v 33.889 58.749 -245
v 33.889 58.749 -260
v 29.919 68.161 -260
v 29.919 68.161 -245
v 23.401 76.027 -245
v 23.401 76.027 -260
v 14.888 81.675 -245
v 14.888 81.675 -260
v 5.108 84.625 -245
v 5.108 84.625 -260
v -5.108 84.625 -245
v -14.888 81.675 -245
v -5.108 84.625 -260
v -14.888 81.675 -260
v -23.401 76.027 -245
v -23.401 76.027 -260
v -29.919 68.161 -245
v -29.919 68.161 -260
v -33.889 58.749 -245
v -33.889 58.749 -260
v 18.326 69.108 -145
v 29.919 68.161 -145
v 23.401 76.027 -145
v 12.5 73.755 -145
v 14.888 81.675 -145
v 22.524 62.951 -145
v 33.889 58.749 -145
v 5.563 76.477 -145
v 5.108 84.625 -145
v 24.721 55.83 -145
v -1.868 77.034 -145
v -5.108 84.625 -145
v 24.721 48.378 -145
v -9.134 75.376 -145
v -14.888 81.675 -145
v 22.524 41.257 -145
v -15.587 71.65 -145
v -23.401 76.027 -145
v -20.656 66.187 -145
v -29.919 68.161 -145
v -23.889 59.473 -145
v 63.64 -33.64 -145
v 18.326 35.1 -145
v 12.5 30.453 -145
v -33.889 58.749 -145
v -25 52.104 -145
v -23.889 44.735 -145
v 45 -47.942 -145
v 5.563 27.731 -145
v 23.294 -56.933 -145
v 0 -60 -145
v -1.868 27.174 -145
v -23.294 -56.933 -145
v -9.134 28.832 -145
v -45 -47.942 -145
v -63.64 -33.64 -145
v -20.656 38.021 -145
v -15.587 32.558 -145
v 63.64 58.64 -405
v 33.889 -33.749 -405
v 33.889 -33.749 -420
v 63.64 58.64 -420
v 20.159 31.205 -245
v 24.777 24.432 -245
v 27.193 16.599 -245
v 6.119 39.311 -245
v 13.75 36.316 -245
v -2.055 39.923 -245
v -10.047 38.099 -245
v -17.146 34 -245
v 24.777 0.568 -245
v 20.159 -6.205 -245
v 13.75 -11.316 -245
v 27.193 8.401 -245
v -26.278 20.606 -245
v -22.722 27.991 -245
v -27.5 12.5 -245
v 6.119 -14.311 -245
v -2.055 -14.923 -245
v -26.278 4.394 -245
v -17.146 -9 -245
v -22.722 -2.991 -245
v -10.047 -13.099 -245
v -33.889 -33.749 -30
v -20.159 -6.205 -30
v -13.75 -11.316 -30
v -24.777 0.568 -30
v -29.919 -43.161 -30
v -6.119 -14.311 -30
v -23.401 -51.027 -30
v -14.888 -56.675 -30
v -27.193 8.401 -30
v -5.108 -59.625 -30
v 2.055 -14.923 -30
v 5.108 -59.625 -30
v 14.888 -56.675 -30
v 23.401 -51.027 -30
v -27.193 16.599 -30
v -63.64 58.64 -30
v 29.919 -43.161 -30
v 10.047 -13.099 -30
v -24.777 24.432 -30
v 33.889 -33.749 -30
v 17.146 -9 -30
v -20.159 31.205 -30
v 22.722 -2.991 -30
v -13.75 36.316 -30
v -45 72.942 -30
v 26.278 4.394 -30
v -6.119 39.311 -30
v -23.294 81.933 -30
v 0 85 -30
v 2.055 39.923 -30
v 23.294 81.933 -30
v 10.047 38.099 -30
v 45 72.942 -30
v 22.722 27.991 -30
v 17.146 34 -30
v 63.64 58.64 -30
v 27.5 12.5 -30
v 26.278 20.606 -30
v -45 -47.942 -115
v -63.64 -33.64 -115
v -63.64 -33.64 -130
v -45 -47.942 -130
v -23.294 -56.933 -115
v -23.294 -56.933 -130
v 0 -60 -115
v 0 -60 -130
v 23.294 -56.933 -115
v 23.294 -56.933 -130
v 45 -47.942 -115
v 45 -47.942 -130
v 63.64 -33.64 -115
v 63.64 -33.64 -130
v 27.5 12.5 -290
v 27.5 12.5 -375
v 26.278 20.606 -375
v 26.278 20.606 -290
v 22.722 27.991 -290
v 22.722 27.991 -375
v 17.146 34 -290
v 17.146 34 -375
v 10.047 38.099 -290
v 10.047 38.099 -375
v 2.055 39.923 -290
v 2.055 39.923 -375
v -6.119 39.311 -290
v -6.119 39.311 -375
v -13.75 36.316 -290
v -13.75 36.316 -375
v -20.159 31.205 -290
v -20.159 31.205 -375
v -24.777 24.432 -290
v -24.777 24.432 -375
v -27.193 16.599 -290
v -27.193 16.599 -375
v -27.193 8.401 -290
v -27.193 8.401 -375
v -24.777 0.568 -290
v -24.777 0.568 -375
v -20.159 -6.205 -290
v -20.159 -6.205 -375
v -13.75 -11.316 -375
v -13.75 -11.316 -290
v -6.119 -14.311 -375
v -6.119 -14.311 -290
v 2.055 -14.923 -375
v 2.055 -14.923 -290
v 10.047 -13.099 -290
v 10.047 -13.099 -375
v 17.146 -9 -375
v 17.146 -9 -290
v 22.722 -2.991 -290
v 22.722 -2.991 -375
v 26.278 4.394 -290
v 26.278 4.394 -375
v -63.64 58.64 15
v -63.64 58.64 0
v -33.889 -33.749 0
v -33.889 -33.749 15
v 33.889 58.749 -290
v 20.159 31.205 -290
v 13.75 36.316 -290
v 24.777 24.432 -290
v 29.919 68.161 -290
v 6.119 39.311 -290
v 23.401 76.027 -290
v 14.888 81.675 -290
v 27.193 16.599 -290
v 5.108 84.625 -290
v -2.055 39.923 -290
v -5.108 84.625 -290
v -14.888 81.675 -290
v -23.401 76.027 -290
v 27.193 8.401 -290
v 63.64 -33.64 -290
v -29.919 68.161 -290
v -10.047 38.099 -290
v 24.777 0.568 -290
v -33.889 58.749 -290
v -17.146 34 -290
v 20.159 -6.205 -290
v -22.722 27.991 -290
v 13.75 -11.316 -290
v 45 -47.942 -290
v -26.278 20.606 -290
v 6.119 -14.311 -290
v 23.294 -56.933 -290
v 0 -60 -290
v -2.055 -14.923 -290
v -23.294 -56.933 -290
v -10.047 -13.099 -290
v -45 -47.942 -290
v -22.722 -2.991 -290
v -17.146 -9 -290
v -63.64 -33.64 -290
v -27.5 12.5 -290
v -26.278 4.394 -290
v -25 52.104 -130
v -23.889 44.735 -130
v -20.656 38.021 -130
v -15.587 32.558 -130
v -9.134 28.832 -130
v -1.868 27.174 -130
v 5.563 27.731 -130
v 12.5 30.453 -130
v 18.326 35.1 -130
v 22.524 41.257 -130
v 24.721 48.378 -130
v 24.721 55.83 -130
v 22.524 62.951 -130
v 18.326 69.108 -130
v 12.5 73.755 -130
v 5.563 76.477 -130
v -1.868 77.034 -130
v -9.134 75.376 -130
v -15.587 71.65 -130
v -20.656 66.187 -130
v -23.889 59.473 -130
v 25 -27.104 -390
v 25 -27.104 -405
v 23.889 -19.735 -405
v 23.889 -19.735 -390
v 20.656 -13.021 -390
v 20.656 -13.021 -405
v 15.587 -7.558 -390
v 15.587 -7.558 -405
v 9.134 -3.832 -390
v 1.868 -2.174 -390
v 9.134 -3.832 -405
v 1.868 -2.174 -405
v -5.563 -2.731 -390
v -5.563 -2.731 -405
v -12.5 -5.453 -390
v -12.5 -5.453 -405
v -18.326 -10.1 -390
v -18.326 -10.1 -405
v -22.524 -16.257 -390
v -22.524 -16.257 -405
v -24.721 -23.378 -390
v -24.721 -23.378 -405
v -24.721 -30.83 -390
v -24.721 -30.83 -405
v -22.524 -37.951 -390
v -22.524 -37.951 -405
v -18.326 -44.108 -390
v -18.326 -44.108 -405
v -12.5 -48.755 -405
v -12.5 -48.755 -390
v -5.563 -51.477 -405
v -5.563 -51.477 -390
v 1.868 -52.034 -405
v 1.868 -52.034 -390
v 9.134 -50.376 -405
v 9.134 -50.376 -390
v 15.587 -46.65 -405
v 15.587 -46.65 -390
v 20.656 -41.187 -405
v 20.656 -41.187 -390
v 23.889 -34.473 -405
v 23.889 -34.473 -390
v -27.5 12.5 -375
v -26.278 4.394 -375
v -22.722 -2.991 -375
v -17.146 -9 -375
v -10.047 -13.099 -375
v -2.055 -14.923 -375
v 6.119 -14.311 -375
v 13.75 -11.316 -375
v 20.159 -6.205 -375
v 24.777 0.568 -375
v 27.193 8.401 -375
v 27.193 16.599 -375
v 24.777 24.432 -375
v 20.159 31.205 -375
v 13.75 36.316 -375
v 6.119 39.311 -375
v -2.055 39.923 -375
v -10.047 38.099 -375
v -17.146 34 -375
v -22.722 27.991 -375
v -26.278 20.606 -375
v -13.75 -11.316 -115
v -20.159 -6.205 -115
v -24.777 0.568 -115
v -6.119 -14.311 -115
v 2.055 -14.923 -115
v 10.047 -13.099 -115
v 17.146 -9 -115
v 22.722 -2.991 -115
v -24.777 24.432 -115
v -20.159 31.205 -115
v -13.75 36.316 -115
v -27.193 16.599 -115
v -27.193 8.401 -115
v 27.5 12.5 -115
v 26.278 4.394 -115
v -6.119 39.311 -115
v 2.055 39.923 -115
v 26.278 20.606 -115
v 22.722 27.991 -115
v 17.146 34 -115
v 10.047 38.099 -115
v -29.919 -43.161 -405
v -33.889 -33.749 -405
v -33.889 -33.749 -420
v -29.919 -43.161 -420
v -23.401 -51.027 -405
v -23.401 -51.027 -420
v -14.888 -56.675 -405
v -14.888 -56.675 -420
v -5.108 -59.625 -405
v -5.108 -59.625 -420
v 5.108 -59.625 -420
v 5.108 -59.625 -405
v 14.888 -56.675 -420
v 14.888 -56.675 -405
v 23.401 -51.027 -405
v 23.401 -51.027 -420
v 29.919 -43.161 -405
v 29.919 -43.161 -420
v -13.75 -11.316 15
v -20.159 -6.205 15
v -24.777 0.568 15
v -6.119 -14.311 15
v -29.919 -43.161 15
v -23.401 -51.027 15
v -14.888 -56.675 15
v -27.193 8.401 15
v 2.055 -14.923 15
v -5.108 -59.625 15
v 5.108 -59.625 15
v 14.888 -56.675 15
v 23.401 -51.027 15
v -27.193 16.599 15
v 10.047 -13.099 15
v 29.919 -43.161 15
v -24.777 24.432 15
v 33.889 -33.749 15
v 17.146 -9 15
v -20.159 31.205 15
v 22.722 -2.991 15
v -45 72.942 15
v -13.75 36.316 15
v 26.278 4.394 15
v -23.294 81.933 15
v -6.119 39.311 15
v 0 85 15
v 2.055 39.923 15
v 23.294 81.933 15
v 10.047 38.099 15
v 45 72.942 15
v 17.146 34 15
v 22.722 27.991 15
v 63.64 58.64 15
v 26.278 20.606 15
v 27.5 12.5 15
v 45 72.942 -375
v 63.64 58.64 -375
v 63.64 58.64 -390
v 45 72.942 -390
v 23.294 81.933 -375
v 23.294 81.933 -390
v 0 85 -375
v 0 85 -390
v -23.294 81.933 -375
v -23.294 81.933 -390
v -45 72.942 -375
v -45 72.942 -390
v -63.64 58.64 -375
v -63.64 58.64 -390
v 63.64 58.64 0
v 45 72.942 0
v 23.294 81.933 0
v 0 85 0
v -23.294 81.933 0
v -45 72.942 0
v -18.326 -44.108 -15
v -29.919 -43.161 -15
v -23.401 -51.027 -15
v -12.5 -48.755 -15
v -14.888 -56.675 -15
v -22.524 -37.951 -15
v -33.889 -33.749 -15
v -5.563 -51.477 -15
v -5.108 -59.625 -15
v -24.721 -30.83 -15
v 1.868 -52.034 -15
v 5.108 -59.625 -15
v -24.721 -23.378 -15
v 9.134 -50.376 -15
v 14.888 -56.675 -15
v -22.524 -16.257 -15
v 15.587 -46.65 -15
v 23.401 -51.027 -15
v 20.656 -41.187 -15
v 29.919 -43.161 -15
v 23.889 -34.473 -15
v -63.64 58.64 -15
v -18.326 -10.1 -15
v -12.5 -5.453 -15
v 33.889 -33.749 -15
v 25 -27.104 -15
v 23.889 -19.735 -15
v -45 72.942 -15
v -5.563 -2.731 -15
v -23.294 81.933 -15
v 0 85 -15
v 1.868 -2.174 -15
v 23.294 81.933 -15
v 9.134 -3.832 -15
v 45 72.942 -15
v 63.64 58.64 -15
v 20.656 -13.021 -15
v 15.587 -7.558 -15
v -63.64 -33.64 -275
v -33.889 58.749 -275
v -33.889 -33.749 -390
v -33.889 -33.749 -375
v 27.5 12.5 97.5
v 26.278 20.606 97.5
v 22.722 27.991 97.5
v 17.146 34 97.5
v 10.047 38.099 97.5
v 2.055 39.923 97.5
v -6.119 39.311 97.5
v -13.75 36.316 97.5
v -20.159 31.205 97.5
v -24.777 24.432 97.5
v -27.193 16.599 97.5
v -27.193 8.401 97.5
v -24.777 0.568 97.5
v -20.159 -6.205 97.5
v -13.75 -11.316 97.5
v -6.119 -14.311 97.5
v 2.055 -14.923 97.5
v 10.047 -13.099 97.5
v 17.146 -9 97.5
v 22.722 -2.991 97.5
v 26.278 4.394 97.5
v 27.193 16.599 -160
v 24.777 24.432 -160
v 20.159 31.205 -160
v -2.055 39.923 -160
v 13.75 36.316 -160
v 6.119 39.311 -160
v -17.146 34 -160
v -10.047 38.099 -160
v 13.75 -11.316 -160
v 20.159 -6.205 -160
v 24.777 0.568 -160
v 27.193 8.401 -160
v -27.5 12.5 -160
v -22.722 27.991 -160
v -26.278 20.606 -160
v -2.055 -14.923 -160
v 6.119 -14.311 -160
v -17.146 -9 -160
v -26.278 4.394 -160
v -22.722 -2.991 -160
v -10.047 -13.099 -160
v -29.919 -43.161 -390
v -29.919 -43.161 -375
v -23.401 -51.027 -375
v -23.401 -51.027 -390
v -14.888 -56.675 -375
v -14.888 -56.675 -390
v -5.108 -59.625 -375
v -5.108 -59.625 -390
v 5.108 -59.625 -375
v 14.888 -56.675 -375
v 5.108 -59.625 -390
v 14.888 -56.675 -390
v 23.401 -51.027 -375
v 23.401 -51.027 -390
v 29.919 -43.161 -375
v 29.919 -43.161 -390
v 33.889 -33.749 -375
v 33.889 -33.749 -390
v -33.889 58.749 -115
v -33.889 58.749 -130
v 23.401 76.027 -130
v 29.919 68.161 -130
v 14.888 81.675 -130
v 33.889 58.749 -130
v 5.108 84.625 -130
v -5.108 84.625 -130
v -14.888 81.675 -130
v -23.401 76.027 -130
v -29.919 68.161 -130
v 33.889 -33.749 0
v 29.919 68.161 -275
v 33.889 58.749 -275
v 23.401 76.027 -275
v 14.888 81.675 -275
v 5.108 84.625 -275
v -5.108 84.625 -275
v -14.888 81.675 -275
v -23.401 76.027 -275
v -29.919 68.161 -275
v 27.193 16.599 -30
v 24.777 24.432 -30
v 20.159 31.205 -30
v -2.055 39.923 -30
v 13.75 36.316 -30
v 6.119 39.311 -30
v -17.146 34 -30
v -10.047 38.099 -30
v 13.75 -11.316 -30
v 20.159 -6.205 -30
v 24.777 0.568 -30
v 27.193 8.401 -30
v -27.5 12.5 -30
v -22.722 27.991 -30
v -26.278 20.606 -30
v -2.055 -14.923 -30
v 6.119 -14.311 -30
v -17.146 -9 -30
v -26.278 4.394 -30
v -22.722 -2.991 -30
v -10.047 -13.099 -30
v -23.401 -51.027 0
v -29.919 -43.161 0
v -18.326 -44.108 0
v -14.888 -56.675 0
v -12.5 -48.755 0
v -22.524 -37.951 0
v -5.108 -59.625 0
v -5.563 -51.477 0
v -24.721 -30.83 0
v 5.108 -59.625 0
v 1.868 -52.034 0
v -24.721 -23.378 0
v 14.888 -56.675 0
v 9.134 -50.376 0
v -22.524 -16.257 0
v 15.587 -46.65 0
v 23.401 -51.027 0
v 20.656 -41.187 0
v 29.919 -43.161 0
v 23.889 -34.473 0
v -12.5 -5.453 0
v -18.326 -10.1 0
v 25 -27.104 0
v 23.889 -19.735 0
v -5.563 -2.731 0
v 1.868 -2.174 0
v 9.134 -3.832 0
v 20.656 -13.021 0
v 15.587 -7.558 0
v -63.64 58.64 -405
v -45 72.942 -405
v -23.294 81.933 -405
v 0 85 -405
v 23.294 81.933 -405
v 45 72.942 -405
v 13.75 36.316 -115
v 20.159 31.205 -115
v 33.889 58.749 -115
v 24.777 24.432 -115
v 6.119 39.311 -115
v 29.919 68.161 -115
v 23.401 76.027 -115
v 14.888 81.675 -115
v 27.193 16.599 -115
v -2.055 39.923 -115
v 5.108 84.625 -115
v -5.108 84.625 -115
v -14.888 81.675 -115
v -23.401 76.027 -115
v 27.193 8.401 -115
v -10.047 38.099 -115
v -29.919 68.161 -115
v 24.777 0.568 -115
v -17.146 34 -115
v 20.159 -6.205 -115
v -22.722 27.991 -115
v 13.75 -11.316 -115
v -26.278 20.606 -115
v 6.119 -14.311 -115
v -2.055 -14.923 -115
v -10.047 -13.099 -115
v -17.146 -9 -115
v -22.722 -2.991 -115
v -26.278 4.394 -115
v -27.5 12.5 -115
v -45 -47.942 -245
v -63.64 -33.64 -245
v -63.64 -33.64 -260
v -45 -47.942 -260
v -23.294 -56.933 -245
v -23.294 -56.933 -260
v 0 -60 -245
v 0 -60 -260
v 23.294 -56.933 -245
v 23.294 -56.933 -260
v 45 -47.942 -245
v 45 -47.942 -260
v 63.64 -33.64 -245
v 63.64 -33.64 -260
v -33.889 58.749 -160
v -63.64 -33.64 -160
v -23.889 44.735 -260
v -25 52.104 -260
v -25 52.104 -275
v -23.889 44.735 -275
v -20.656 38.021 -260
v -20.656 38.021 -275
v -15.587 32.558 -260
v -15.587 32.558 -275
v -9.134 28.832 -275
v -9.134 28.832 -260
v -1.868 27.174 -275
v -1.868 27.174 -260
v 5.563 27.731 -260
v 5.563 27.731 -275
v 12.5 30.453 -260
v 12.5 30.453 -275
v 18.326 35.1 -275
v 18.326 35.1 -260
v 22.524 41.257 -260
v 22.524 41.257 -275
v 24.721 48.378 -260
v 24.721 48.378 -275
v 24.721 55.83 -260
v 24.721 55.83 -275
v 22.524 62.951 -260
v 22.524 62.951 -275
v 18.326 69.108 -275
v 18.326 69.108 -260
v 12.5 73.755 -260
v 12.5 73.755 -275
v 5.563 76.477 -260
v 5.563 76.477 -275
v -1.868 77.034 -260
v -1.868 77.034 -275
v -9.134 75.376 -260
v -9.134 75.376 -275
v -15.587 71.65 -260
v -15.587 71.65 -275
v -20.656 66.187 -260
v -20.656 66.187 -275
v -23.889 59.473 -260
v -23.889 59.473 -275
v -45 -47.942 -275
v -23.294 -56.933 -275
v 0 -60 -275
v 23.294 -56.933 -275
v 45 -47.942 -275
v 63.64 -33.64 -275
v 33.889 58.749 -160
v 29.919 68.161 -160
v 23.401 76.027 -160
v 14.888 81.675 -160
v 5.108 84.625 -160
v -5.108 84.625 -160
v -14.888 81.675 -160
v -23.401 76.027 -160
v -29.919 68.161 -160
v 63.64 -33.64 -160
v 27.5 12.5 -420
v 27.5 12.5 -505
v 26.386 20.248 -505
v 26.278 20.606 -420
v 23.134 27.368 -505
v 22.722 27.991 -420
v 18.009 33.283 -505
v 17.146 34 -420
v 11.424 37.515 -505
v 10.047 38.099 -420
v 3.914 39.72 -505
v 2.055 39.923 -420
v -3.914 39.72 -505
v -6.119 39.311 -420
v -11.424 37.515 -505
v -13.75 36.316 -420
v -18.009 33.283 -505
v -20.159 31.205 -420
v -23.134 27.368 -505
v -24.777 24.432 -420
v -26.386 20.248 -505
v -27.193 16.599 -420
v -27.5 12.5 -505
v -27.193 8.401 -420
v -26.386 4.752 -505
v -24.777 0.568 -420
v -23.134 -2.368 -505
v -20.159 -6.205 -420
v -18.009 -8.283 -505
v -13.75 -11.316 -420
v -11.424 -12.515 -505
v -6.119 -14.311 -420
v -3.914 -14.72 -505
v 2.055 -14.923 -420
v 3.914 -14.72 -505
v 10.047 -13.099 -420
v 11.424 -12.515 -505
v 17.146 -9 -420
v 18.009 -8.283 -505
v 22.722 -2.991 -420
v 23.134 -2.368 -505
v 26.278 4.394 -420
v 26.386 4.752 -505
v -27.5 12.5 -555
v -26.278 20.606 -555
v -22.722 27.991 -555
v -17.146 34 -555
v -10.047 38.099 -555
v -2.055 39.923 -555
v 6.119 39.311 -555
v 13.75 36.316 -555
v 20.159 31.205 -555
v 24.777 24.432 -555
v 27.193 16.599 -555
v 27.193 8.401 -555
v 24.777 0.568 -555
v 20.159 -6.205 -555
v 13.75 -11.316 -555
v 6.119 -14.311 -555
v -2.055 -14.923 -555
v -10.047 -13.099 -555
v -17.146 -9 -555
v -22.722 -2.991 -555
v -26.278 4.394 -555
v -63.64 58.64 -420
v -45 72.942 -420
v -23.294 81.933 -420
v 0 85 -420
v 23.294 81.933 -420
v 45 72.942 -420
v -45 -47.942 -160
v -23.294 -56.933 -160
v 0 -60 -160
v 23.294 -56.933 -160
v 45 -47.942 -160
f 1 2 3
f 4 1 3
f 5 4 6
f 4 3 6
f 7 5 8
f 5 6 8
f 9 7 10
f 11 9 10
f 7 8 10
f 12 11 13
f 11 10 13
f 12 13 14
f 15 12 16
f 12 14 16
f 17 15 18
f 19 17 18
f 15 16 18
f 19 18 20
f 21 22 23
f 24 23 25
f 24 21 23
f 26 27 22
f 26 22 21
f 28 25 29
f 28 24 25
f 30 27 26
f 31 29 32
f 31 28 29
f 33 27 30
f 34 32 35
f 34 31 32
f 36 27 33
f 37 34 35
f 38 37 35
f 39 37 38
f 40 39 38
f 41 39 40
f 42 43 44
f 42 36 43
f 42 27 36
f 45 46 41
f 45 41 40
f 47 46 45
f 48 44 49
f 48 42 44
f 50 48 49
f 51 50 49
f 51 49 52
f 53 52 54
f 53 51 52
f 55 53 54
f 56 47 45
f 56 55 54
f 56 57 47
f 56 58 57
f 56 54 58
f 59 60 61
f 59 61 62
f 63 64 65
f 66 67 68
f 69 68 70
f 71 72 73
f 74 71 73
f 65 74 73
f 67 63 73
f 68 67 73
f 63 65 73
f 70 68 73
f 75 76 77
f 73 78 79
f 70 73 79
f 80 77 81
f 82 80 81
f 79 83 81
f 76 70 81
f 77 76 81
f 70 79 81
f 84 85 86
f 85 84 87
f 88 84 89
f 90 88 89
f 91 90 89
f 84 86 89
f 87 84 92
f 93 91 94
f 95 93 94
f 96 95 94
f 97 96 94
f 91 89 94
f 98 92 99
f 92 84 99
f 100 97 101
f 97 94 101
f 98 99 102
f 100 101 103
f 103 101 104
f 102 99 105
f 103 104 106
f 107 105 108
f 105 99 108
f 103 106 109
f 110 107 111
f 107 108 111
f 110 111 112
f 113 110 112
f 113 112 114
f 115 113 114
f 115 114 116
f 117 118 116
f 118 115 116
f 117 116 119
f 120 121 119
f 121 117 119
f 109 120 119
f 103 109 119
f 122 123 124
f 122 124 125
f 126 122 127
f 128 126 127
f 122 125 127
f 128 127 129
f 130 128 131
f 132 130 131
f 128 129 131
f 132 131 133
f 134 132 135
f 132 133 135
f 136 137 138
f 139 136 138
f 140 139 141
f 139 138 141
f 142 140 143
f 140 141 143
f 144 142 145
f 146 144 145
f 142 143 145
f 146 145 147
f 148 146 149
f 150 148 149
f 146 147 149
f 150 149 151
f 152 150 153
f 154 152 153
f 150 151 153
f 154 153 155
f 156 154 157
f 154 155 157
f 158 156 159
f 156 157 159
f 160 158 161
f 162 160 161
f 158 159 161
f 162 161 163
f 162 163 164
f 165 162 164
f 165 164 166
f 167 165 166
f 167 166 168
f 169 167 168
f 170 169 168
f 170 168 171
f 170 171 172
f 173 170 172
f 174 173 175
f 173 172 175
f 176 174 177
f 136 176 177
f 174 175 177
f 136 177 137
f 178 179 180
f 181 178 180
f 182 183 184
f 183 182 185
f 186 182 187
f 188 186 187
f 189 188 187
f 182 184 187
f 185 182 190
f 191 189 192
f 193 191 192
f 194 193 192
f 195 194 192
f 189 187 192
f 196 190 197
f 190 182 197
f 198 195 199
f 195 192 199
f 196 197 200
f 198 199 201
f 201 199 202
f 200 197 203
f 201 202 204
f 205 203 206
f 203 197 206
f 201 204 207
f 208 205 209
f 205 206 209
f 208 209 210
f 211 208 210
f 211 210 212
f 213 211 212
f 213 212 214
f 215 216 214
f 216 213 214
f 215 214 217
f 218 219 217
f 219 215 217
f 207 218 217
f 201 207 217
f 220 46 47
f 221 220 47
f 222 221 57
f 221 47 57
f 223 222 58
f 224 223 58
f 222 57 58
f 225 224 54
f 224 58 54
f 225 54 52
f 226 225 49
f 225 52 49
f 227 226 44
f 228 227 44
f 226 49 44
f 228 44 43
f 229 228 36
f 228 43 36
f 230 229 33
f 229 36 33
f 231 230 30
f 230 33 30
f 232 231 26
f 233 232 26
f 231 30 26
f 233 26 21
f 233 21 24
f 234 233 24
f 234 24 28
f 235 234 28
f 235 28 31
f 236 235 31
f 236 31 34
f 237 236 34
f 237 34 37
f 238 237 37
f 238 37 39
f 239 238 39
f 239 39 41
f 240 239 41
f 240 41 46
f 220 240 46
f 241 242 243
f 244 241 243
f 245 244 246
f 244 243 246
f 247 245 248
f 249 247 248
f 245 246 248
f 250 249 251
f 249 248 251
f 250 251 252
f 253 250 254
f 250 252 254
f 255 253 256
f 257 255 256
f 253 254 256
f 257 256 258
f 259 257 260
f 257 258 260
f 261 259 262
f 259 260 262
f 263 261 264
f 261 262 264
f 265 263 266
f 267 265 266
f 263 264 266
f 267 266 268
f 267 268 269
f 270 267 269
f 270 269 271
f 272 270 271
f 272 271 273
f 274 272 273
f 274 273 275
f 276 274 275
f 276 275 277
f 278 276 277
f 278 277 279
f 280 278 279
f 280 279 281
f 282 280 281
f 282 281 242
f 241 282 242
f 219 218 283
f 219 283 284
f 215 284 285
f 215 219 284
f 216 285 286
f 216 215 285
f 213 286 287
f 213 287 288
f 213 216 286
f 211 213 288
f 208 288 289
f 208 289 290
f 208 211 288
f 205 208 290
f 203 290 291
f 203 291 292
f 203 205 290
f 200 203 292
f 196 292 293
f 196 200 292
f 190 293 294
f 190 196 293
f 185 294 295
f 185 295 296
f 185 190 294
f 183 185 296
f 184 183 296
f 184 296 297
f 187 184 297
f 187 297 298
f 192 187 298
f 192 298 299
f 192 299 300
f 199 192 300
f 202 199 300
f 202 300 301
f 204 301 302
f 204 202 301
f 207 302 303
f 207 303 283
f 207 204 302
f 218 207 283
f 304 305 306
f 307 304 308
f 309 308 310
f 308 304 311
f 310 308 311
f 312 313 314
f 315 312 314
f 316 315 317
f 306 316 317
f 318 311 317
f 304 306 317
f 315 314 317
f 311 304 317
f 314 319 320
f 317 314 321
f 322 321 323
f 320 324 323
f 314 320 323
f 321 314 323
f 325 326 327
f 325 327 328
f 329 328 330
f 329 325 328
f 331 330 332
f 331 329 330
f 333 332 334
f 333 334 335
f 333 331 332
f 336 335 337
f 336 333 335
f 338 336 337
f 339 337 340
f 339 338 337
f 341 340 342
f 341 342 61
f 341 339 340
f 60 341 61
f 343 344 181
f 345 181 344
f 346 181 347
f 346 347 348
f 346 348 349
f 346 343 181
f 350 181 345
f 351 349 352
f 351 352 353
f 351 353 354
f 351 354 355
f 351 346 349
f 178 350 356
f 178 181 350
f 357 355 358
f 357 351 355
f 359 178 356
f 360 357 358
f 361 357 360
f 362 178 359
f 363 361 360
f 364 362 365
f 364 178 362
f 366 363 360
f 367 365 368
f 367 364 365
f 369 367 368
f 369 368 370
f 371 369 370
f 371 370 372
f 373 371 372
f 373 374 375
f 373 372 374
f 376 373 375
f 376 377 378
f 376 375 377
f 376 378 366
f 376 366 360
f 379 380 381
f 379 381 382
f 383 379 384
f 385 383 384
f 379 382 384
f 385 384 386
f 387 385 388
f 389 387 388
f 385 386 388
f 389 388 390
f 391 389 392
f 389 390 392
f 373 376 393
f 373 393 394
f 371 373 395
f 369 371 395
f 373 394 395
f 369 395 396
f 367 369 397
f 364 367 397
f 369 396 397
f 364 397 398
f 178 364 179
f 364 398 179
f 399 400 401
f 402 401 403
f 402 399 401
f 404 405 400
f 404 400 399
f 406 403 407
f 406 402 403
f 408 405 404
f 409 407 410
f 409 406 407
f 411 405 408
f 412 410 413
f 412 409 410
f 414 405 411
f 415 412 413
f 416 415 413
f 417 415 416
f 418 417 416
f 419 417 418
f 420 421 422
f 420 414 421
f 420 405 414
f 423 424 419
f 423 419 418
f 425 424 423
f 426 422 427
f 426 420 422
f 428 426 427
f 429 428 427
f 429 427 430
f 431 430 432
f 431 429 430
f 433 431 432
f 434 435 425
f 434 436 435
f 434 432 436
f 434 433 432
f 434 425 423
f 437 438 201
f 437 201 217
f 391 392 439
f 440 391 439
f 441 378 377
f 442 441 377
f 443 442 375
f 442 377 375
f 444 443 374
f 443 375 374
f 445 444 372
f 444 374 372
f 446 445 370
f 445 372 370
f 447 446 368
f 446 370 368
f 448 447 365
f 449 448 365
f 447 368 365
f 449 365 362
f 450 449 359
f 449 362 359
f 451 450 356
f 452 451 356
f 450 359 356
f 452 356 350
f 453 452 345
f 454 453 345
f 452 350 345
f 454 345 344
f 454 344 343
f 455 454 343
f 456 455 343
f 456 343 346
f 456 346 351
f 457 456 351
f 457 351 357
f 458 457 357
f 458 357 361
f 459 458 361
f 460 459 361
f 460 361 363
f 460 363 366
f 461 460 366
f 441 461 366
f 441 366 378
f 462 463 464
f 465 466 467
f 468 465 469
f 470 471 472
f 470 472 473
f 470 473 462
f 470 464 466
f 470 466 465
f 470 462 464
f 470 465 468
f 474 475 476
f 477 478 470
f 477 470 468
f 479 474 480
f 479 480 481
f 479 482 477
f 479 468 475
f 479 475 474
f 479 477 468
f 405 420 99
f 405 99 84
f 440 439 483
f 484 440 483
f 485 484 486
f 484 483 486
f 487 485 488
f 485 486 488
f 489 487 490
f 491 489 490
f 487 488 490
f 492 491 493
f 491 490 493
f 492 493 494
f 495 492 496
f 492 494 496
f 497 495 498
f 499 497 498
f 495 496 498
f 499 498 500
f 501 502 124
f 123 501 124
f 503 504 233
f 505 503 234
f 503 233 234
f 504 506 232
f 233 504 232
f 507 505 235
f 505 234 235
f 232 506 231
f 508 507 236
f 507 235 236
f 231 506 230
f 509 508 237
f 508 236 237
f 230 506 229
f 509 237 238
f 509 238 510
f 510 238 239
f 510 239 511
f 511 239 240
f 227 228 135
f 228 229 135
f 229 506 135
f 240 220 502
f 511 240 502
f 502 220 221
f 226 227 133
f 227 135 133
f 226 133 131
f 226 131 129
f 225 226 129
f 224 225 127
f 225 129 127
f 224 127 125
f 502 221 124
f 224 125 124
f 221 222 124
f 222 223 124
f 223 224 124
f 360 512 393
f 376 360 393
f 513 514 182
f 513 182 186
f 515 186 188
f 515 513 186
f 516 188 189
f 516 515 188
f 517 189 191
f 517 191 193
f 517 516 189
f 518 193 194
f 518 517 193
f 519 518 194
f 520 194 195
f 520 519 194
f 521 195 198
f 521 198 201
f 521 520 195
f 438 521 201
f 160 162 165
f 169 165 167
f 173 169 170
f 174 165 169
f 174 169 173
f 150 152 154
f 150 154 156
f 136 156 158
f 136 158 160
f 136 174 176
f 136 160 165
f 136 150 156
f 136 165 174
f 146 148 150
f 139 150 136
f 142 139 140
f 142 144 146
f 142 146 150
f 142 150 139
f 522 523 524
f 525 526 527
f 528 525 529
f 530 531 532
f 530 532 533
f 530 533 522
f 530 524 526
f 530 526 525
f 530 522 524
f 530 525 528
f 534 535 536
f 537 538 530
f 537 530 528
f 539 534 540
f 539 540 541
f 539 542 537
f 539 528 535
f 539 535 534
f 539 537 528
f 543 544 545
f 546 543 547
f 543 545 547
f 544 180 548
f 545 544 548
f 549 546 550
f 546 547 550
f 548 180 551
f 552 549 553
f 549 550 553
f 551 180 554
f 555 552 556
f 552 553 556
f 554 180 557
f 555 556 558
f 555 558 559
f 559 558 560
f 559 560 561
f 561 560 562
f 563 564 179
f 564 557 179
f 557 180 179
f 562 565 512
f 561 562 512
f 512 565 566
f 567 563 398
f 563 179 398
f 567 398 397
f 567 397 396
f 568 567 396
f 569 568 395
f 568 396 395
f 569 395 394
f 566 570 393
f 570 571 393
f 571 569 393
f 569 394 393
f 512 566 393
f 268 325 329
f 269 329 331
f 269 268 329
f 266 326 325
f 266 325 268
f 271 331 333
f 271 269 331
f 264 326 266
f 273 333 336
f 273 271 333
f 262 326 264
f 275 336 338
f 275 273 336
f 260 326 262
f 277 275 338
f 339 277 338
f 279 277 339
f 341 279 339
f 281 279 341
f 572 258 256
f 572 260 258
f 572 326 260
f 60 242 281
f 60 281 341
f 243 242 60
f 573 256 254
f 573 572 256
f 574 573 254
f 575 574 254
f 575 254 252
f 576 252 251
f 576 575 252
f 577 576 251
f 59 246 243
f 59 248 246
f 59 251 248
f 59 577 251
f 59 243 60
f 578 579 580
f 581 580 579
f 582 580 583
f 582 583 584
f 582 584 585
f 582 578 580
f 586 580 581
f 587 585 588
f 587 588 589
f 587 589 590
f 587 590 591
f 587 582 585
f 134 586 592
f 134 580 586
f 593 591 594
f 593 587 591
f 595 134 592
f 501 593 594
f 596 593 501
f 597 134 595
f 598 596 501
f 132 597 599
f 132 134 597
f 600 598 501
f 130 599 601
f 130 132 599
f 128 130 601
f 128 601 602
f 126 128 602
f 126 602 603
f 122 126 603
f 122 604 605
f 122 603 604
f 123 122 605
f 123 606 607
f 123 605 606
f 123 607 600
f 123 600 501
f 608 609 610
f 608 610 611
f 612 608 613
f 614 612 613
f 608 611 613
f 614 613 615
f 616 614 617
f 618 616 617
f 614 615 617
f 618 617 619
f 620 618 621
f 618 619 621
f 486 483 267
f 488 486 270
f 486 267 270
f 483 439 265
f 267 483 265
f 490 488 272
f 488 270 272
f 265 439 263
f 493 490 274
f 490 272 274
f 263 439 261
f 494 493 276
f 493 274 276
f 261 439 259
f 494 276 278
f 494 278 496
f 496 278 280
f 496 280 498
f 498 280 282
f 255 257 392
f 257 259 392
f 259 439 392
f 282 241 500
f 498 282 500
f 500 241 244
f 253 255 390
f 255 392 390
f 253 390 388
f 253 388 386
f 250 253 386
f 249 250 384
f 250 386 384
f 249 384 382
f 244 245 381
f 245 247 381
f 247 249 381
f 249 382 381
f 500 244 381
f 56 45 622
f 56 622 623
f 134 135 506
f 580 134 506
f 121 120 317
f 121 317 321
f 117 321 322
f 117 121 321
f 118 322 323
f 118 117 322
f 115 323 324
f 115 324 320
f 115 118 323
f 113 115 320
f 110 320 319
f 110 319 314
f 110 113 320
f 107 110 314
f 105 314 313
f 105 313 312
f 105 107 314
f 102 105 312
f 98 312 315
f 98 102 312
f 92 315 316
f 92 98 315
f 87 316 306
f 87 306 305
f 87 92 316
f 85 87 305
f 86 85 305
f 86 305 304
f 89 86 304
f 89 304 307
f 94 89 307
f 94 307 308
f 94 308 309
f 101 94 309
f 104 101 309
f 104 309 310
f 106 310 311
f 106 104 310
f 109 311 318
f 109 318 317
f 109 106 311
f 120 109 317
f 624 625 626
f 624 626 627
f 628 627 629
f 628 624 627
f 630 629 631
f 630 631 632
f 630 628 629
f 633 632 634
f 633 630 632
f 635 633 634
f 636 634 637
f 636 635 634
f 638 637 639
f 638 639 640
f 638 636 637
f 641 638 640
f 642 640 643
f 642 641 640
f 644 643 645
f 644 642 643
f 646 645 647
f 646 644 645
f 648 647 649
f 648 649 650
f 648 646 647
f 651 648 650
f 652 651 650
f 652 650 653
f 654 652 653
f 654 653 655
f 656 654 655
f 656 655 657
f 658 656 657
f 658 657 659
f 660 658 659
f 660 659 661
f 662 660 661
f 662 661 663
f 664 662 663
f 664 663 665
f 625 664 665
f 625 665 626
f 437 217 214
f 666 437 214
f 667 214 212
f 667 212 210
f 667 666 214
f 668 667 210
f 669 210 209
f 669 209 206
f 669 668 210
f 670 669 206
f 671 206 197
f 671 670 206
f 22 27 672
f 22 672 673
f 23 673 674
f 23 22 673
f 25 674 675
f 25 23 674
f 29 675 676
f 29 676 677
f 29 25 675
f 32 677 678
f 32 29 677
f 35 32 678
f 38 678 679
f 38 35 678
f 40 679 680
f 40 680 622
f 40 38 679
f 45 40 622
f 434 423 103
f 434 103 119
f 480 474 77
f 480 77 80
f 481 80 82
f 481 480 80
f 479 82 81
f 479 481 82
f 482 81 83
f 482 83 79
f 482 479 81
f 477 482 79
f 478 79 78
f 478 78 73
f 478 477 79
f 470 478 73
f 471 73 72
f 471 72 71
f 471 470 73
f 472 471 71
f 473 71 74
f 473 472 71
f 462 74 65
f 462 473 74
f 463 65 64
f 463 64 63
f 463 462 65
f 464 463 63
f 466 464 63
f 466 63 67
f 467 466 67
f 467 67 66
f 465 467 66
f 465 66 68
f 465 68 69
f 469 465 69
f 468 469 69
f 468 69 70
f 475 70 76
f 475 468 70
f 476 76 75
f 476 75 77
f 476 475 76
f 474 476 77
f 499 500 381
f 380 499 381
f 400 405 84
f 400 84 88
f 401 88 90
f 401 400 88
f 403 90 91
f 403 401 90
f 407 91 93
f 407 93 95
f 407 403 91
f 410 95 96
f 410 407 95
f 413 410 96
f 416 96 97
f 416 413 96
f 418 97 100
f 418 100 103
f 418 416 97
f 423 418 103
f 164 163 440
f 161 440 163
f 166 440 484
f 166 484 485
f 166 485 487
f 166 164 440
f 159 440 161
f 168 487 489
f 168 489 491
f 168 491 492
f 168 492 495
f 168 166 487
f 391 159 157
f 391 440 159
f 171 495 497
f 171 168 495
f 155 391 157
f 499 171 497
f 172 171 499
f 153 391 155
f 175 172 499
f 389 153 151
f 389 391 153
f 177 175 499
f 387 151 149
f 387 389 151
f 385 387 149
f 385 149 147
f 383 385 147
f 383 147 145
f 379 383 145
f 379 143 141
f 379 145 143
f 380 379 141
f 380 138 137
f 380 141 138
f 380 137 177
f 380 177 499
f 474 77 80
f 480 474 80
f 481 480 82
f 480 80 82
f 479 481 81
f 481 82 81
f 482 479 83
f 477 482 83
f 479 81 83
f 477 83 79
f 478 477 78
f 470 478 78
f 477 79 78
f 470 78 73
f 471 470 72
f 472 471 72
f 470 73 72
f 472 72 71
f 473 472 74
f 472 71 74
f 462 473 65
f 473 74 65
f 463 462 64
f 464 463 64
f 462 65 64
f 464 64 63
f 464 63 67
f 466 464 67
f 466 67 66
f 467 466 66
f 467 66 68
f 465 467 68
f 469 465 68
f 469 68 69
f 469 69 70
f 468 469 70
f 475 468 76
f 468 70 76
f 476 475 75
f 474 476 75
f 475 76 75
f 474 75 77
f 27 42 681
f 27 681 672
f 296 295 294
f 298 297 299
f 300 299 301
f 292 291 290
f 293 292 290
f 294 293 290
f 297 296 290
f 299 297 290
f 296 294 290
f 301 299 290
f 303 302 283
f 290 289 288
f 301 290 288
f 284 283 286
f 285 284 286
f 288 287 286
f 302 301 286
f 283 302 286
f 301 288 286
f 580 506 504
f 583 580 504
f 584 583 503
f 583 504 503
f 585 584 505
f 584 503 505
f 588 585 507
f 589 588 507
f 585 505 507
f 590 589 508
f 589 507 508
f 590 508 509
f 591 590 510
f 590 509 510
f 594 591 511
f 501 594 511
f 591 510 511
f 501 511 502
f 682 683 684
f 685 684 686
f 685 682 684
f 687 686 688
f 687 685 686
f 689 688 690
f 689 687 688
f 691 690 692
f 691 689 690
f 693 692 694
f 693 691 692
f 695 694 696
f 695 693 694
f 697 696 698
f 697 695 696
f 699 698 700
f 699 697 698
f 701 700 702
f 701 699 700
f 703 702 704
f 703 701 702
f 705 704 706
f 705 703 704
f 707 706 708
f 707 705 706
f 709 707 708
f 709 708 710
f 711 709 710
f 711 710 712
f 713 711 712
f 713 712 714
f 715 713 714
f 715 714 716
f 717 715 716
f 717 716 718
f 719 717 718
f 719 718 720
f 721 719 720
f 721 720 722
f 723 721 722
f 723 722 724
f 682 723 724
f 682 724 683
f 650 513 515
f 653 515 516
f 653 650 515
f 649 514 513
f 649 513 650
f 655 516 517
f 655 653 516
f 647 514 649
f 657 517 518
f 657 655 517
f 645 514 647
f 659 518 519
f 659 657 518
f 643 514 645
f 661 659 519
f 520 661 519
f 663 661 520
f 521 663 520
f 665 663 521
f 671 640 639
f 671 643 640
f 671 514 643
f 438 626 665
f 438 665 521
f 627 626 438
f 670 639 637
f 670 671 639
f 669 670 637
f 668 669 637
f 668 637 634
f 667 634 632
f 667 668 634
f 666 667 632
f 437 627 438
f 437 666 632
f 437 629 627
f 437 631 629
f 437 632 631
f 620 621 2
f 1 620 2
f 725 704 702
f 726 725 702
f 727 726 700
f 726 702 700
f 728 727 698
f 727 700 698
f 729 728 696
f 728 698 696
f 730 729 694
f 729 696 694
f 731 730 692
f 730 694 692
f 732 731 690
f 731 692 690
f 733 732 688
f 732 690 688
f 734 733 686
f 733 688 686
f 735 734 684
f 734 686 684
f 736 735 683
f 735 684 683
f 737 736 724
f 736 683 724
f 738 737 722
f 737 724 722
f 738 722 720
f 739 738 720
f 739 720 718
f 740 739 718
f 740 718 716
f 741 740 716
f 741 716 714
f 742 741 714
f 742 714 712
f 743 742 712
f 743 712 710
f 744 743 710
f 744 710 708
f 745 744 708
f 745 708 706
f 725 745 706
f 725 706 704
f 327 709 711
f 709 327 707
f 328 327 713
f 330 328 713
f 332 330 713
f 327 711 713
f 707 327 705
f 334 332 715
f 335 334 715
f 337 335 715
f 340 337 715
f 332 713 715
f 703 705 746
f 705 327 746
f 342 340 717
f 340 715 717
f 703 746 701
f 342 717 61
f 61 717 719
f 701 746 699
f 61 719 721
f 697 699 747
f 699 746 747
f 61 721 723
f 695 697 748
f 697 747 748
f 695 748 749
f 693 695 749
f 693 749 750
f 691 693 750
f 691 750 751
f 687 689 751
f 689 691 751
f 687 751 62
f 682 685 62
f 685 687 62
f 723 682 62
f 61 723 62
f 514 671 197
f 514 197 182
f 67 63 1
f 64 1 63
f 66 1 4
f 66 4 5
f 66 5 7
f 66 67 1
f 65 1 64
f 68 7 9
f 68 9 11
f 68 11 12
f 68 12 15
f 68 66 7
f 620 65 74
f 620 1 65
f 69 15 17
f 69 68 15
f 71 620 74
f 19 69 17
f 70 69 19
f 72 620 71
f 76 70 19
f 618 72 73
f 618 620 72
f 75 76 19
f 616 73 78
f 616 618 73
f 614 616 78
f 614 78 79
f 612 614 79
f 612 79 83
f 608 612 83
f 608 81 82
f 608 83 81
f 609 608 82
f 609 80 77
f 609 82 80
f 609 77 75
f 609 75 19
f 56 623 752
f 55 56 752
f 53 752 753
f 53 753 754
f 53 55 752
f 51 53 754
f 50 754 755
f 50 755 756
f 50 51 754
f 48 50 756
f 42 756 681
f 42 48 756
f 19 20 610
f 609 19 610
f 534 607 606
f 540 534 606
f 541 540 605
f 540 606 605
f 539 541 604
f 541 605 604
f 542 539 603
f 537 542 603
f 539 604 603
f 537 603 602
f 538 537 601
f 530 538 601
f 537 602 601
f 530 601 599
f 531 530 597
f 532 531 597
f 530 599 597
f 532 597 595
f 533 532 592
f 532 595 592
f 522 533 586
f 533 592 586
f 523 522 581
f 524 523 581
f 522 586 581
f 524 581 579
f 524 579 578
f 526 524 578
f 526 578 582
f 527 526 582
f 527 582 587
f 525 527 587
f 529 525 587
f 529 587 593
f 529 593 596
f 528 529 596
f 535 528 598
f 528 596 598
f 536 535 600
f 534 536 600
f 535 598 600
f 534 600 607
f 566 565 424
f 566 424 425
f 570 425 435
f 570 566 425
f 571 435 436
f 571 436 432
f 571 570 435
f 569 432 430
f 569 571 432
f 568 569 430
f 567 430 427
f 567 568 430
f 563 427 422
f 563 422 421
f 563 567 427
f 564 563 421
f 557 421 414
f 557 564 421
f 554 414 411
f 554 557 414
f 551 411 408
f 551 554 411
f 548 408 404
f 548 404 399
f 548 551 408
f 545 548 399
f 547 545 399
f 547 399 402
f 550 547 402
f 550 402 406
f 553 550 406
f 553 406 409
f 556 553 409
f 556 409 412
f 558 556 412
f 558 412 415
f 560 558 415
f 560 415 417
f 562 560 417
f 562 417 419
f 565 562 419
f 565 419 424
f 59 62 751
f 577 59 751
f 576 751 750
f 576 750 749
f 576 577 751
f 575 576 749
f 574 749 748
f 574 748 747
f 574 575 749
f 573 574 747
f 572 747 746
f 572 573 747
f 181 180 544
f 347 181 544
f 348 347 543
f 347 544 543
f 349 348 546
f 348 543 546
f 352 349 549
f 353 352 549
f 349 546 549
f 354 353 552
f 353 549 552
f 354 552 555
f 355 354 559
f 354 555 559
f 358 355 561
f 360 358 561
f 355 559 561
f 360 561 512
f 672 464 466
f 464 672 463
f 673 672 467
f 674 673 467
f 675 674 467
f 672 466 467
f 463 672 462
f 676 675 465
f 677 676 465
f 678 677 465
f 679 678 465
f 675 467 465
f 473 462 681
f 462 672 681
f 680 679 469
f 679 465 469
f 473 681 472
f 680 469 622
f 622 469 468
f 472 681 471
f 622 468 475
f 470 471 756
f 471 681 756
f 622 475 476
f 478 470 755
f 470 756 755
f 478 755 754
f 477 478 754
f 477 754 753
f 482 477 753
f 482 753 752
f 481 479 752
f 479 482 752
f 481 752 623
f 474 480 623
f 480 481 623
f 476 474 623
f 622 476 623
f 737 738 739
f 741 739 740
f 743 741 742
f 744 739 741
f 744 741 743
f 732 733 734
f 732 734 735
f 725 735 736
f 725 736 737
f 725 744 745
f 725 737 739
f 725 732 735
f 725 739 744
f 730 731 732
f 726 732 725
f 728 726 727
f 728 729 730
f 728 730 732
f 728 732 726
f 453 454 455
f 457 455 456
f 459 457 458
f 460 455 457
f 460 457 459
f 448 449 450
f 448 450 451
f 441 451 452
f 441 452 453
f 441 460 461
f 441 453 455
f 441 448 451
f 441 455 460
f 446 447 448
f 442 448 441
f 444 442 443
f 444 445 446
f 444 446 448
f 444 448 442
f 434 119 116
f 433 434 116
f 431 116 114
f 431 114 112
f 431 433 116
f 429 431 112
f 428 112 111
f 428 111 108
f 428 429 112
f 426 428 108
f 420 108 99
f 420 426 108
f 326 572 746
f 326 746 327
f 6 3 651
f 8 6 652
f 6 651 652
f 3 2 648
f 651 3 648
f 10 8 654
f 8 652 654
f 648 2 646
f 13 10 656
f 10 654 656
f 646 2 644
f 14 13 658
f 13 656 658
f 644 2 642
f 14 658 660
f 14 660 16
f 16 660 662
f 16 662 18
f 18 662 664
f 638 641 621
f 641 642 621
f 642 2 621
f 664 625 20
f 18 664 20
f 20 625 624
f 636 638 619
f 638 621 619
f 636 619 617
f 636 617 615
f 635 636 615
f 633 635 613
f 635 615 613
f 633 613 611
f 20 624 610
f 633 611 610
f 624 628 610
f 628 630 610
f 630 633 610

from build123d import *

# Parameters (mm, degrees)
BOSS_EXTRUDE1_DEPTH   = 15
SKETCH3_R             = 25
BOSS_EXTRUDE2_DEPTH   = 30
SKETCH4_R             = 27.5
BOSS_EXTRUDE3_DEPTH   = 85
BODY_MOVE_COPY3_ANGLE = 180
BOSS_EXTRUDE5_START   = 302.5
SKETCH6_R             = 27.5
BOSS_EXTRUDE5_DEPTH   = 50
SKETCH5_R             = 27.5
CUT_EXTRUDE4_DEPTH    = 2.5


with BuildPart() as part:
    # Sketch1 → Boss-Extrude1 (new body)
    with BuildSketch(Plane.XY):
        with BuildLine():
            Line((-63.639610307, 58.639610307), (-33.888985145, -33.748524782))
            ThreePointArc((-33.888985145, -33.748524782), (0, -60), (33.888985145, -33.748524782))
            Line((33.888985145, -33.748524782), (63.639610307, 58.639610307))
            ThreePointArc((63.639610307, 58.639610307), (0, 85), (-63.639610307, 58.639610307))
        make_face()
    extrude(amount=BOSS_EXTRUDE1_DEPTH)

    # Sketch3 → Boss-Extrude2 (add)
    with BuildSketch(Plane.XY.offset(15)):
        with Locations((0, -27.10409222)):
            Circle(SKETCH3_R)
    extrude(amount=-BOSS_EXTRUDE2_DEPTH)

    # Sketch4 → Boss-Extrude3 (add)
    with BuildSketch(Plane.XY.offset(15)):
        with Locations((0, 12.5)):
            Circle(SKETCH4_R)
    extrude(amount=BOSS_EXTRUDE3_DEPTH)

    # Mirror5: part across plane


with BuildPart() as part_1:
    add(part.part)
    add(part.part.mirror(Plane(origin=(0, 0, -7.5), x_dir=(1, 0, 0), z_dir=(0, 0, -1))))


with BuildPart() as body_2:
    # Mirror6: mirrored copy
    add(part_1.part.mirror(Plane(origin=(0, 0, -72.5), x_dir=(1, 0, 0), z_dir=(0, 0, -1))))


with BuildPart() as body_2_1:
    # Body-Move/Copy3: moved
    add(body_2.part.rotate(Axis((0, 12.5, 0), (0, 0, 1)), BODY_MOVE_COPY3_ANGLE))


with BuildPart() as body_3:
    # Mirror7: mirrored copy
    add(body_2_1.part.mirror(Plane(origin=(0, 0, -202.5), x_dir=(1, 0, 0), z_dir=(0, 0, -1))))


with BuildPart() as body_4:
    # Mirror9: mirrored copy
    add(part_1.part.mirror(Plane(origin=(0, 0, -202.5), x_dir=(1, 0, 0), z_dir=(0, 0, -1))))

    # Sketch6 → Boss-Extrude5 (add)
    with BuildSketch(Plane(origin=(0, 0, -202.5), x_dir=(-1, 0, 0), z_dir=(0, 0, -1)).offset(BOSS_EXTRUDE5_START)):
        with Locations((0, 12.5)):
            Circle(SKETCH6_R)
    extrude(amount=BOSS_EXTRUDE5_DEPTH)


with BuildPart() as part_2:
    add(part_1.part)

    # Sketch5 → Cut-Extrude4 (cut)
    with BuildSketch(Plane.XY.offset(100)):
        with Locations((0, 12.5)):
            Circle(SKETCH5_R)
    extrude(amount=-CUT_EXTRUDE4_DEPTH, mode=Mode.SUBTRACT)


solid = Compound([body_2_1.part, body_3.part, body_4.part, part_2.part])
